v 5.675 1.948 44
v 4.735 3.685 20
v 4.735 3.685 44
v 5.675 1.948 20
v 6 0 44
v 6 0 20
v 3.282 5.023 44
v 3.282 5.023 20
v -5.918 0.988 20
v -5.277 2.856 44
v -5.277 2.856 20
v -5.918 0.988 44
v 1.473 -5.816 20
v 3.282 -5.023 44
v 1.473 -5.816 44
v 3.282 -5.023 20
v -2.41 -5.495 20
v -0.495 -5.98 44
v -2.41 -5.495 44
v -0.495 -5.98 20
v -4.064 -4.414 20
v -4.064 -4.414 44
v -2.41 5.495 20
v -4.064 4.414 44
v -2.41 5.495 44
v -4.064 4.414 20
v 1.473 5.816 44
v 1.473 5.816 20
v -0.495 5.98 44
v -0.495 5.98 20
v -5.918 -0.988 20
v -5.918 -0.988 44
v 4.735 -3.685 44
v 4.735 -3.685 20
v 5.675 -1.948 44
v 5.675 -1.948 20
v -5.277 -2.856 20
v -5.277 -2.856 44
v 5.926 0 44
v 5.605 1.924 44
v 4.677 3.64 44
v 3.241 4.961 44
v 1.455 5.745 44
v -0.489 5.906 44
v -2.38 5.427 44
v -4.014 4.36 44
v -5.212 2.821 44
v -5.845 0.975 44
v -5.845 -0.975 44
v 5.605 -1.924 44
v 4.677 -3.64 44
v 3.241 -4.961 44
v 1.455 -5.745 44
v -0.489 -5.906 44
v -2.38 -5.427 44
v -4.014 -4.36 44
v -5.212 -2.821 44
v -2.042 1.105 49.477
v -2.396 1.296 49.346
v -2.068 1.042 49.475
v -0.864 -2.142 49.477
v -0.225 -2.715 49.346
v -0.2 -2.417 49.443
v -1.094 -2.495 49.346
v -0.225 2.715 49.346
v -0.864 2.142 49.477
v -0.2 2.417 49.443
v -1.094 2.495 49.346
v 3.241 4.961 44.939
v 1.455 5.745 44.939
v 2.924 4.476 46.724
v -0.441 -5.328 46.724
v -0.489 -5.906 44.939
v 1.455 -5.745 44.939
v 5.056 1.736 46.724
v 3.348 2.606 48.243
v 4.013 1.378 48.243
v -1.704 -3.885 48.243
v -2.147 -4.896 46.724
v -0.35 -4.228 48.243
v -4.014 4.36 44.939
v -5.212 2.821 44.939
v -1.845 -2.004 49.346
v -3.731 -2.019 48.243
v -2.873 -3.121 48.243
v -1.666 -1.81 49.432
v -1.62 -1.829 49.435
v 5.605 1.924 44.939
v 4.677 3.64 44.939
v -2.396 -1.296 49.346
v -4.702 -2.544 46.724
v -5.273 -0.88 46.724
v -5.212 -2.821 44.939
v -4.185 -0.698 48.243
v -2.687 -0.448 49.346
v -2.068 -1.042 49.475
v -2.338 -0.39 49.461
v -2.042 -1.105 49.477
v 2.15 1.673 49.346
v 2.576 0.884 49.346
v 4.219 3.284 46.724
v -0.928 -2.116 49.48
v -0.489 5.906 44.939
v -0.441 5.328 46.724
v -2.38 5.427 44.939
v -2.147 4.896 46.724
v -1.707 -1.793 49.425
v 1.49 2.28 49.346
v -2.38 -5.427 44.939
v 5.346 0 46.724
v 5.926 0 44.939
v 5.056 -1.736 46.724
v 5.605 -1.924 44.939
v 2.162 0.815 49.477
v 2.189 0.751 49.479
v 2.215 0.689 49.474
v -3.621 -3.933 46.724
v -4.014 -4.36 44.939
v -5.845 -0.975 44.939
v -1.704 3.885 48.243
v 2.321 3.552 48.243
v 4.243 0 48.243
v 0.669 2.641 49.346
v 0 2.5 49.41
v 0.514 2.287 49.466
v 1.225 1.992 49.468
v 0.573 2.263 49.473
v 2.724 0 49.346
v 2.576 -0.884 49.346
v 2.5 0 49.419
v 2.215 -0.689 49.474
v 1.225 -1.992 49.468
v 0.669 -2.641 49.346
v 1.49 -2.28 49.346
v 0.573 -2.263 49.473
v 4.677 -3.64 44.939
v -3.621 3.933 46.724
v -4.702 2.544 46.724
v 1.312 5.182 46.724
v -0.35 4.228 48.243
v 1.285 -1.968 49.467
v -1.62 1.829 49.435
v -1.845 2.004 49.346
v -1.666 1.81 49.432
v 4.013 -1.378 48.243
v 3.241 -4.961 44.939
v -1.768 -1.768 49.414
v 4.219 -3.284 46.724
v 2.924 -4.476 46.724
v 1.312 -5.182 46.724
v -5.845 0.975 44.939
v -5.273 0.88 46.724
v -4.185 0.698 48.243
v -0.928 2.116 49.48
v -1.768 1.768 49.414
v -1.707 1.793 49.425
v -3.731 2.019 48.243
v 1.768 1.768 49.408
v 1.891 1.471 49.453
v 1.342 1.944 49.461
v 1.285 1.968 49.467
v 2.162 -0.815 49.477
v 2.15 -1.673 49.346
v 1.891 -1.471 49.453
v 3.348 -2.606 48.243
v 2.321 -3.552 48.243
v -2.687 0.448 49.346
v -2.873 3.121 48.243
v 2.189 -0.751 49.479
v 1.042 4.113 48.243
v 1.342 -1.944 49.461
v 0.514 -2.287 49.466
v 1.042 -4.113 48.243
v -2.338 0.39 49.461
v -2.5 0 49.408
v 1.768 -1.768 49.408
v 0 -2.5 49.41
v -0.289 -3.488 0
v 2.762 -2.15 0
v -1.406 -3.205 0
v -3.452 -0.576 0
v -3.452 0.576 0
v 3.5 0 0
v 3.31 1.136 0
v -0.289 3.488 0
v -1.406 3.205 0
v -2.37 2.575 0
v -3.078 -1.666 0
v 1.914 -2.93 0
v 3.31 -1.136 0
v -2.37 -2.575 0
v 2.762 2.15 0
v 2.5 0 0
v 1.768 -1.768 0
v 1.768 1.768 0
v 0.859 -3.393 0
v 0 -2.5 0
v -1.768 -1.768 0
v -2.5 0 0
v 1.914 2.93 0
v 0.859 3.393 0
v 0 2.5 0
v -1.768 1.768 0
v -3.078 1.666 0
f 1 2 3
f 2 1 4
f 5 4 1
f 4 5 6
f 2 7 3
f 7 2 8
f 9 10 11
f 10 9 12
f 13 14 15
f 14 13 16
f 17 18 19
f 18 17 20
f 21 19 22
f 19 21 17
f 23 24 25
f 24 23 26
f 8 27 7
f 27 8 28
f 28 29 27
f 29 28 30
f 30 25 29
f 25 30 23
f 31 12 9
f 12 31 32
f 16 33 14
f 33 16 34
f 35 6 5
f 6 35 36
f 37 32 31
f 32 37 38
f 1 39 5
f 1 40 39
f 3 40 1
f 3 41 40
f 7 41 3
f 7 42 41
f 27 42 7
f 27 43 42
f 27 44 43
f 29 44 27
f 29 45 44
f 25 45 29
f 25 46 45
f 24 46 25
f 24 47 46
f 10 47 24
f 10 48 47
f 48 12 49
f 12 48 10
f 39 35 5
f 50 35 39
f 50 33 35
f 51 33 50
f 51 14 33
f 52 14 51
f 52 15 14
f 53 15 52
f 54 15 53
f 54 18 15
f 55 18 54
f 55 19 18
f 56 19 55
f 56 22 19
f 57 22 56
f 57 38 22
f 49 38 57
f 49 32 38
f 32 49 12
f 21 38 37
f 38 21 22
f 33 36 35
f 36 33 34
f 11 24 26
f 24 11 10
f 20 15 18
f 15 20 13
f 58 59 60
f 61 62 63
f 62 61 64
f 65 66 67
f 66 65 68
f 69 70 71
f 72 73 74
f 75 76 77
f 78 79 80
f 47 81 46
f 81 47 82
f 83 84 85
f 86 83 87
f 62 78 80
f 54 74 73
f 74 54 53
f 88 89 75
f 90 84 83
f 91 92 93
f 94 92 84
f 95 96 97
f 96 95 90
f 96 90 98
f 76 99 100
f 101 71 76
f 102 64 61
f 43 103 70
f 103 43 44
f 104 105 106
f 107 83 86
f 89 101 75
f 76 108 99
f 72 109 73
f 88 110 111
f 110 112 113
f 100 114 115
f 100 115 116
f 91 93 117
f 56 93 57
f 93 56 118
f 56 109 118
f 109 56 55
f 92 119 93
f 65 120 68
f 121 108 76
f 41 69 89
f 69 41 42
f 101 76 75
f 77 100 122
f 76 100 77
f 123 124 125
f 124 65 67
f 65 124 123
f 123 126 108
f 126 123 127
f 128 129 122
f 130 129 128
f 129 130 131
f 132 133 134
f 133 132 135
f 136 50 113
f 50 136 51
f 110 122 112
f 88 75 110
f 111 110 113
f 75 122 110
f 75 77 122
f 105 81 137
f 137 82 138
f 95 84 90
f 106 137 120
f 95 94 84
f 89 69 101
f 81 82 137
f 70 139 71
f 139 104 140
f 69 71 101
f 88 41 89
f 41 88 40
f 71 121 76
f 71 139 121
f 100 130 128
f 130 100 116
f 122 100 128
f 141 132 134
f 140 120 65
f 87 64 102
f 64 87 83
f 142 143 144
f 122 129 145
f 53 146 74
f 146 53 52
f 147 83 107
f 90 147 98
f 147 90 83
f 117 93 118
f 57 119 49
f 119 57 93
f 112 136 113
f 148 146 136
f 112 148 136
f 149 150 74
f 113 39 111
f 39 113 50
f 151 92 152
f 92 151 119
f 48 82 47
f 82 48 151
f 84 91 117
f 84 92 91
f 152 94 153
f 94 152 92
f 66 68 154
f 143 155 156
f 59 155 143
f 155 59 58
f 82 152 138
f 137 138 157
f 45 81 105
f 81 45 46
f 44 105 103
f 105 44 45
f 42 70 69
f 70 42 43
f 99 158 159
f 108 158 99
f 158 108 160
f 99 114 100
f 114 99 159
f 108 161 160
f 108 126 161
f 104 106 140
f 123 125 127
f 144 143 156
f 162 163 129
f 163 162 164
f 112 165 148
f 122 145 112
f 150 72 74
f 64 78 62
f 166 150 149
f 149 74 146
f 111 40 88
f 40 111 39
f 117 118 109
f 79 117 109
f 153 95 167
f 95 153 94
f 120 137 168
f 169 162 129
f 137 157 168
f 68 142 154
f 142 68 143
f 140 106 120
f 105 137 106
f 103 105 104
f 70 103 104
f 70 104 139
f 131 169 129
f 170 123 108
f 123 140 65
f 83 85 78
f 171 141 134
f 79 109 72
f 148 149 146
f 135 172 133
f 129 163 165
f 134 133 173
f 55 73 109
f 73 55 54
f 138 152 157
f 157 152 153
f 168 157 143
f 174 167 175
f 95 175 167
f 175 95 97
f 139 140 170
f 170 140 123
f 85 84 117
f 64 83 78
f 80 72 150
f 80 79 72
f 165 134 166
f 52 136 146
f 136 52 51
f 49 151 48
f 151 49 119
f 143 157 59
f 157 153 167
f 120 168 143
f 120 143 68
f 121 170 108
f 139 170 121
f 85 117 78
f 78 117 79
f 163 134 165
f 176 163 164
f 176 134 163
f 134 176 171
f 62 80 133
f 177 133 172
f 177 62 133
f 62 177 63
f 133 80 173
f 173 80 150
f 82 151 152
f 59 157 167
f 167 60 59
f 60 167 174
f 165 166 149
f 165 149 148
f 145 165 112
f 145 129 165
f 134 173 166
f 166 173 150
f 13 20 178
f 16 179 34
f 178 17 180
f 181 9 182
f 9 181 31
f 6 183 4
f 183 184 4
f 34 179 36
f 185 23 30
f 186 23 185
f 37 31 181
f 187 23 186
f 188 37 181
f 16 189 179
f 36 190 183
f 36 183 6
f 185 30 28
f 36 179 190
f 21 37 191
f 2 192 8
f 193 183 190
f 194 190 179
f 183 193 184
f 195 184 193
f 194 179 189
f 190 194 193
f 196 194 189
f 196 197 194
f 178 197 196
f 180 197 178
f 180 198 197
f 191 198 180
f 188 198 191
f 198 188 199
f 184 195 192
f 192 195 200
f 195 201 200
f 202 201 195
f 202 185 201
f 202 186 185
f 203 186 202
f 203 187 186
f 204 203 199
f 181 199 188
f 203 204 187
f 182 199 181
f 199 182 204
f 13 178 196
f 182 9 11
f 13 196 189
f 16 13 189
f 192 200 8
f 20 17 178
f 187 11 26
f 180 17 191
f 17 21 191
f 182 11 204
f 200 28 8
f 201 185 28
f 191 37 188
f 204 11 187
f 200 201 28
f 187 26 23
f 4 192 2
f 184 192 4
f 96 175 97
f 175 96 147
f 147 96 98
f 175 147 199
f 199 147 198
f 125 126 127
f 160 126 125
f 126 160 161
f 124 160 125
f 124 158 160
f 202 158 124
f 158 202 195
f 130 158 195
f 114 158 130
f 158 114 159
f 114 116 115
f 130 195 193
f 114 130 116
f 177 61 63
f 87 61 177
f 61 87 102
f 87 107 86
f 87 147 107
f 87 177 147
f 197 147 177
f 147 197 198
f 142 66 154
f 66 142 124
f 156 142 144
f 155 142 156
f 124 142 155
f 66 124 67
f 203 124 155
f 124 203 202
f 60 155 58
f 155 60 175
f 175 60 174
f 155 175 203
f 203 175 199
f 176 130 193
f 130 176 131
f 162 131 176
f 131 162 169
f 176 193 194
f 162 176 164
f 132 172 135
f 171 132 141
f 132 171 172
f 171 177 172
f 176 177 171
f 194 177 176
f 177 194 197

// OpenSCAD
h1 = 50;
h2 = 20;
d1 = 7;
d2 = 5;
d3 = 12;

difference() {
    union() {
        translate([0, 0, h2]) cylinder(h=h1-h2-d3/2, d1=d3, d2=d3);
        translate([0, 0, h1-d3/2]) sphere(d=d3);
        cylinder(h=h2, d1=d1, d2=d3);
    }
    cylinder(h=100, d=d2);
}
